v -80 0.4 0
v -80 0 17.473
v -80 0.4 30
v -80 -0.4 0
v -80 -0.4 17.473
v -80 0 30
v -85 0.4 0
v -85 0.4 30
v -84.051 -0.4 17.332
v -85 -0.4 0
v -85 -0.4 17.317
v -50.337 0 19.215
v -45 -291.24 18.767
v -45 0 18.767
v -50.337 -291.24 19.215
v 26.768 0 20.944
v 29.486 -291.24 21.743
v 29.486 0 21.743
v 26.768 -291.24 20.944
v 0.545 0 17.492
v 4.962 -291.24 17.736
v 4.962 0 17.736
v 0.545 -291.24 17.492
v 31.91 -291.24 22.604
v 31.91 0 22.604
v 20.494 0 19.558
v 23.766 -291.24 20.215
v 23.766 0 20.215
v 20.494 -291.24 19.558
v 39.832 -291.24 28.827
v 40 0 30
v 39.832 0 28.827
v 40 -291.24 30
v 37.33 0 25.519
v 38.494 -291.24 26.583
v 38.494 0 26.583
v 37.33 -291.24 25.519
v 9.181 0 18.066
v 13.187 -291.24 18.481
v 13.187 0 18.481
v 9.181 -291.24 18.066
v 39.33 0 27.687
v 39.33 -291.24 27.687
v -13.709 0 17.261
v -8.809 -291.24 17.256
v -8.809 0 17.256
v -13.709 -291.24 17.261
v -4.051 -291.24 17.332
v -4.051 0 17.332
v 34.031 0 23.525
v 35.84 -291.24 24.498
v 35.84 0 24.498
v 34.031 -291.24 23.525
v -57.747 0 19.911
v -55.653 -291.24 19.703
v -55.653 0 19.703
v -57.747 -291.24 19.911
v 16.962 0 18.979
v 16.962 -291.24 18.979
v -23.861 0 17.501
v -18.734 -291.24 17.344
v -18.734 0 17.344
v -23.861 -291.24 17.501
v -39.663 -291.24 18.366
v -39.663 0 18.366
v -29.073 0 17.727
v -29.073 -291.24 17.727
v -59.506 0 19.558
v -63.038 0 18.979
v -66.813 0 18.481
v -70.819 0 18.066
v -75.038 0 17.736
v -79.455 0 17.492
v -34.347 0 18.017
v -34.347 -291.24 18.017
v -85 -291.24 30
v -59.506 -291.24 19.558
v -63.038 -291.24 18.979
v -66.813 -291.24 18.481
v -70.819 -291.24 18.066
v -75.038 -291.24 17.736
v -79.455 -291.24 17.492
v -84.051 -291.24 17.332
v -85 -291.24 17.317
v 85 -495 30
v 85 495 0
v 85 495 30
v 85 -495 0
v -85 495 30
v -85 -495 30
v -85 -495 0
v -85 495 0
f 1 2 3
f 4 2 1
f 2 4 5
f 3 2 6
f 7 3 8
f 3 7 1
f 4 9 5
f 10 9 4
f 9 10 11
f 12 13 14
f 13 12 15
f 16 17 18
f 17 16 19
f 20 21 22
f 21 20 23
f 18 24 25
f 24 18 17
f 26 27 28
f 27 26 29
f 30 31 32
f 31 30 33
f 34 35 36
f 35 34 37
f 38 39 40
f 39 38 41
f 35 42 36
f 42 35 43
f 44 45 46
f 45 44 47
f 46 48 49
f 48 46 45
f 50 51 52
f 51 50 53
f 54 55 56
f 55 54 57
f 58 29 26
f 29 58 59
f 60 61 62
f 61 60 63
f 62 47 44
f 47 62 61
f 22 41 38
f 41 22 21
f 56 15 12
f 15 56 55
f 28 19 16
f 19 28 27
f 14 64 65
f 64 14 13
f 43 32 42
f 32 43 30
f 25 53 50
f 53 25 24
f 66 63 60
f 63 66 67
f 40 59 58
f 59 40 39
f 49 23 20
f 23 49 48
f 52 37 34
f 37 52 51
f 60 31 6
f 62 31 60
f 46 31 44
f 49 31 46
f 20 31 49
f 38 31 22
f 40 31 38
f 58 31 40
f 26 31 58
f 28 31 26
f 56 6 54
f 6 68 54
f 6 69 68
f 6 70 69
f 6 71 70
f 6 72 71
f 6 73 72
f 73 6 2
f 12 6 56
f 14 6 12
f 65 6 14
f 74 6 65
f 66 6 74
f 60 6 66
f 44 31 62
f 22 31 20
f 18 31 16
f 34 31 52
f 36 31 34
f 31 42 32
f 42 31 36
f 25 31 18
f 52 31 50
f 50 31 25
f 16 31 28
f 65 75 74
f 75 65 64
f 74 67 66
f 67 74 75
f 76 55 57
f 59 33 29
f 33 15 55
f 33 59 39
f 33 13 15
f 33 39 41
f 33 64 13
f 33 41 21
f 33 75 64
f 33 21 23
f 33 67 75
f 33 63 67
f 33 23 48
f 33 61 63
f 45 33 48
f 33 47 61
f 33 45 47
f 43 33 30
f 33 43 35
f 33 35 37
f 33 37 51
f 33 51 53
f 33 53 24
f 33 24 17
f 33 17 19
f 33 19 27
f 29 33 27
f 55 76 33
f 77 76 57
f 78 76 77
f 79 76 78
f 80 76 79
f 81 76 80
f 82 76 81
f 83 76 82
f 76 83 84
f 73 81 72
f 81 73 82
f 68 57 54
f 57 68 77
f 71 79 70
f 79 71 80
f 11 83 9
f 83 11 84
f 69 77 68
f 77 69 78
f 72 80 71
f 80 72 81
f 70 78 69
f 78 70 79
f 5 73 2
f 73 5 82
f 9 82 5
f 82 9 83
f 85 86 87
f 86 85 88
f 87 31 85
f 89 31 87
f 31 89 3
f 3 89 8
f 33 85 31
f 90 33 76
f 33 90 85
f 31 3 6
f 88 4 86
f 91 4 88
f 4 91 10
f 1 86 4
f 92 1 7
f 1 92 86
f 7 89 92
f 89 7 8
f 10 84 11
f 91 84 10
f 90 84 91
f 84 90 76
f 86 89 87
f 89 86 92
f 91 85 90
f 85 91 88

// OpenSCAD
// file: ../666_1032.scad
draft = true;   // sets rendering quality to draft.
$fs = draft ? 5 : 0.5;
$fa = 10;

module 666_1032(draft){

    airfoil_thickness = 0030;
    depth = main_tube_outer_diameter*2;
    width = main_tube_outer_diameter + 2*(main_tube_outer_diameter/10);
    height = depth;

    beta = 90 - trailing_edge_angle(naca = airfoil_thickness); // calculate the angle of trailing edge
    trailing_wall= 1/(cos(beta)); //calculate lenght of wall cut relative to wall thickness
    echo(trailing_wall); // print a relative thickness of material at traling edge to wall thickness. 

    difference (){
union(){

    difference(){
    	airfoil(naca = airfoil_thickness, L = 170, N=101, h = height_of_vertical_tube + main_tube_outer_diameter/2 + 2*global_clearance + coupling_wall_thickness, open = false);
    	translate ([hull_wall_thickness,0,45])
            resize([170 - hull_wall_thickness - trailing_wall*hull_wall_thickness,(170*airfoil_thickness/100)- 2*hull_wall_thickness,210], auto=true) 
                airfoil(naca = airfoil_thickness, L = 170, N=101, h = height_of_vertical_tube + main_tube_outer_diameter/2 + 2*global_clearance, open = false);
    }
    //lem spodní a horní díl
    intersection(){
        difference(){
            union(){
                translate([0,-75,cover_pilon_division[1] - hull_wall_thickness])
                        cube([190,150,hull_wall_thickness]);
                translate([0,-75,cover_pilon_division[1]])
                        cube([190,150,hull_wall_thickness]);
        }

        translate ([ribbon_width,0,45])
            resize([170 - ribbon_width - trailing_wall*ribbon_width,(170*airfoil_thickness/100)- 2*ribbon_width,210], auto=true) 
                airfoil(naca = airfoil_thickness, L = 170, N=101, h = height_of_vertical_tube + main_tube_outer_diameter/2 + 2*global_clearance, open = false);
    //difference
    }
        airfoil(naca = airfoil_thickness, L = 170, N=101, h = height_of_vertical_tube + main_tube_outer_diameter/2 + 2*global_clearance + coupling_wall_thickness, open = false);
}
}
    	//pro otevření
    	translate ([120,- hull_wall_thickness/2,- 2*global_clearance])
    	   cube ([60,hull_wall_thickness,height_of_vertical_tube + 4*global_clearance]);

    	translate ([main_tube_outer_diameter + coupling_wall_thickness*2,-depth/2 - global_clearance,height_of_vertical_tube - main_tube_outer_diameter*2 - global_clearance/2 + main_tube_outer_diameter/2 + coupling_wall_thickness])
    	   cube ([width*5,depth + 2*global_clearance,height+global_clearance + main_tube_outer_diameter]);

        // hull shell from 666_1025.scad
        translate ([- cover_pilon_position,0,0])
            rotate ([90,0,0])
                drop(draft);
    //final difference
    }
//final module
}


//pro tisk

module 666_1032_A(draft){
        intersection(){
                666_1032(draft);
            translate([0,- 75,0])
                cube([180,150,cover_pilon_division[1]]);
        }
}

module 666_1032_B(draft){
    translate([0,0,20])
        intersection(){
                666_1032(draft);
            translate([0,- 75,cover_pilon_division[1]])
                cube([180,150,cover_pilon_division[2] - cover_pilon_division[1]]);
        }
}

//666_1032(draft);
666_1032_A(draft);
666_1032_B(draft);

use <./lib/naca4.scad>
include <../Parameters.scad>
use <666_1025.scad>
use <888_1000.scad>
// file: ../888_1000.scad
/*
// Nastavení zobrazení
$vpr = [338, 0, 357];
$vpt = [180, 25, -18];
$vpd = 1280;
*/
//improving rendering speed.
draft = true;   // sets rendering quality to draft.
$fs = draft ? 5 : 0.5;
$fa = 10;

/*
TODO: 

Přední díl obsahuje převis ve směru vybrání pro držák motoru. (U horního zámku)
Otvory pro šrouby v předním dílu jsou oválné, protože nejsou kolmo k rovině modelu.


*/




//vnitřní kapka
module hollowing_skeleton(shell_thickness = hull_wall_thickness, draft)
{

    beta = 90 - trailing_edge_angle(naca = hull_airfoil_thickness); // calculate the angle of trailing edge
    trailing_wall= 1/(cos(beta)); //calculate lenght of wall cut relative to wall thickness 

    intersection () {
    resize([hull_drop_length - shell_thickness - trailing_wall* shell_thickness, (hull_drop_length*hull_airfoil_thickness/100) - 2*shell_thickness, (hull_drop_length*hull_airfoil_thickness/100) - 2*shell_thickness], auto=true)
            rotate ([0,90,0])           
            rotate_extrude($fn = draft ? 50 : 100)
                rotate([0,0,90])
                    difference()
                    {
                      polygon(points = airfoil_data(naca=hull_airfoil_thickness, L = hull_drop_length, N=draft ? 50 : 200)); 
                      square(hull_drop_length); 
                    }
                    
      translate([0,0,hull_corner_radius])
        minkowski(){                   
            translate ([0,- hull_y_size , - hull_z_size/2 + shell_thickness])
                cube ([hull_x_size,2*hull_y_size - shell_thickness, hull_z_size - 2*shell_thickness - 2*hull_corner_radius]);
                rotate ([0,90,0])
                    cylinder (h = 1, r = hull_corner_radius, $fn = draft ? 50 : 100);                   
          }
                            
    }
}

module hollowing_skeleton_hem(ribbon_width, draft)
{

    beta = 90 - trailing_edge_angle(naca = hull_airfoil_thickness); // calculate the angle of trailing edge
    trailing_wall= 1/(cos(beta)); //calculate lenght of wall cut relative to wall thickness 

    intersection () {
    resize([hull_drop_length - ribbon_width - trailing_wall* ribbon_width, (hull_drop_length*hull_airfoil_thickness/100) - 2*ribbon_width, (hull_drop_length*hull_airfoil_thickness/100) - 2*ribbon_width], auto=true)
            rotate ([0,90,0])           
            rotate_extrude($fn = draft ? 50 : 100)
                rotate([0,0,90])
                    difference()
                    {
                      polygon(points = airfoil_data(naca=hull_airfoil_thickness, L = hull_drop_length, N=draft ? 50 : 200)); 
                      square(hull_drop_length); 
                    }
                    
      translate([0,0,hull_corner_radius])
        minkowski(){                   
            translate ([0,- hull_y_size, - hull_z_size/2 + ribbon_width])
                cube ([hull_x_size,2*hull_y_size - ribbon_width, hull_z_size - 2*ribbon_width - 2*hull_corner_radius]);
                rotate ([0,90,0])
                    cylinder (h = 1, r = hull_corner_radius, $fn = draft ? 50 : 100);                   
          }
                            
    }
}




//celá kapka
module drop(draft = true)
{

    beta = 90 - trailing_edge_angle(naca = hull_airfoil_thickness); // calculate the angle of trailing edge
    trailing_wall= 1/(cos(beta)); //calculate lenght of wall cut relative to wall thickness 

	intersection () {
    	rotate ([0,90,0])           
        	rotate_extrude($fn = draft ? 50 : 100)
                    rotate([0,0,90])
                        difference()
                        {
	                        polygon(points = airfoil_data(naca=hull_airfoil_thickness, L =hull_drop_length , N=draft ? 50 : 200)); 
    	                    square(hull_drop_length); 
        	            }
            		
        translate([0,0,hull_corner_radius])
          	minkowski(){                   
             	translate ([0,-hull_y_size,-hull_z_size/2])
             			cube ([hull_x_size, 2*hull_y_size,hull_z_size-2*hull_corner_radius]);
             	  	rotate ([0,90,0])
                 		cylinder (h = 1, r = hull_corner_radius, $fn = draft ? 50 : 100);                   
		    }
		    
	}
}


//základní kapka
module drop_skin(draft){

	difference(){
			drop();
		translate([hull_wall_thickness,0,0])
			hollowing_skeleton();
	}

}




drop_skin();














use <./lib/naca4.scad>
include <../Parameters.scad>
// file: ../666_1025.scad
use <./lib/naca4.scad>
include <../Parameters.scad>
use <666_1032.scad>


//Jen pro názornost
	//translate([180,0,0])
		//rotate ([-90,0,0])
			//666_1032();





module 666_1025(){

    beta = 90 - trailing_edge_angle(naca = hull_airfoil_thickness); // calculate the angle of trailing edge
    trailing_wall= 1/(cos(beta)); //calculate lenght of wall cut relative to wall thickness
    echo(trailing_wall); // print a relative thickness of material at traling edge to wall thickness.    

    difference(){
        intersection () {
            union(){
        		rotate ([0,90,0])           
                    rotate_extrude($fn = 100)
                        rotate([0,0,90])
                            difference()
                            {

                              polygon(points = airfoil_data(naca=hull_airfoil_thickness, L =hull_drop_length , N=100)); 
                              square(hull_drop_length); 
                            }

                // 666_1032 part holder
                translate([180,0,0]) 
                    rotate ([-90,0,0]) 
                        difference(){
                            
                            translate ([hull_wall_thickness,0,0])
                                resize([170 - hull_wall_thickness - trailing_wall*hull_wall_thickness,(170*0030/100)- 2*hull_wall_thickness,210], auto=true) 
                                    airfoil(naca = 0030, L = 170, N=101, h = 200, open = false);
                            translate ([2*hull_wall_thickness,0,0])       
                                resize([170 - hull_wall_thickness*2 - trailing_wall*hull_wall_thickness*2,(160*0030/100)- 2*hull_wall_thickness,210], auto=true) 
                                    airfoil(naca = 0030, L = 170, N=101, h = 200, open = false);
                            
                        }

            }
            minkowski(){                   
             	translate ([0,-(main_tube_outer_diameter/2)+1,-hull_z_size/2])
             		cube ([hull_x_size, hull_y_size,hull_z_size]);
             	
             		rotate ([0,90,0])
                 		cylinder (h = 1, r = hull_corner_radius, $fn = 100);                   

        	}

        }   

        //hollowing skeleton
    		translate ([hull_wall_thickness,0,0])
            	intersection () {
                    resize([hull_drop_length - hull_wall_thickness - trailing_wall* hull_wall_thickness, (hull_drop_length*hull_airfoil_thickness/100) - 2*hull_wall_thickness, (hull_drop_length*hull_airfoil_thickness/100) - 2*hull_wall_thickness], auto=true)
                 		rotate ([0,90,0])           
                            rotate_extrude($fn = 100)
                                rotate([0,0,90])
                                    difference()
                                    {

                                      polygon(points = airfoil_data(naca=hull_airfoil_thickness, L = hull_drop_length, N=200)); 
                                      square(hull_drop_length); 
                                    }
                 	minkowski(){                   
                     	translate ([0,-(main_tube_outer_diameter/2),-hull_z_size/2 + hull_wall_thickness])
                     		cube ([hull_x_size,hull_y_size - hull_wall_thickness, hull_z_size - 2*hull_wall_thickness]);
                     		rotate ([0,90,0])
                         		cylinder (h = 1, r = hull_corner_radius, $fn = 100);                   
            		}                   
            	}
            //for front part
    		translate ([-2,-1 - main_tube_outer_diameter/2,-25])
    				cube ([52,hull_y_size+10,50]);

        //for tube in back
    		translate ([hull_x_size-70,0,0])
    			rotate ([0,90,0])
    				cylinder (h = 80, r1 = main_tube_outer_diameter/2, r2 = main_tube_outer_diameter/2, $fn = 200);
    					    
        //for tube - propeller

			translate ([180+2*hull_wall_thickness,-10,0])       
				rotate ([-90,0,0])
                    resize([170 - hull_wall_thickness*2 - trailing_wall*hull_wall_thickness*2,(160*0030/100)- 2*hull_wall_thickness,210], auto=true) 
                        airfoil(naca = 0030, L = 170, N=101, h = 200, open = false);
        			
        //for printing
    		translate([0,-main_tube_outer_diameter/2-4.90,-170/2])
    			cube ([600,5,170]);

    		translate([hull_x_size-50,-main_tube_outer_diameter,-main_tube_outer_diameter/2])		
    			cube([80,main_tube_outer_diameter, main_tube_outer_diameter]);	

    }


}

    intersection(){
        666_1025();
        translate([0,-20,-150])                        
           cube([150,150,300]);
    }

    translate([20,0,0])
        intersection(){
            666_1025();
            translate([150,-20,-150])
               cube([150,150,300]);
        }

    translate([40,0,0])
        intersection(){
            666_1025();
            translate([300,-20,-150])
               cube([150,150,300]);
        }


    translate([60,0,0])
        intersection(){
            666_1025();
            translate([450,-20,-150])
               cube([150,150,300]);
        }
// file: ../lib/naca4.scad
// Naca4.scad - library for parametric airfoils of 4 digit NACA series
// Code: Rudolf Huttary, Berlin 
// June 2015
// commercial use prohibited


// general use: for more examples refer to sampler.scad
// naca = naca digits or 3el vector  (default = 12 or [0, 0, .12])
// L    = chord length [mm]      (default= 100)
// N    = # sample points        (default= 81)
// h    = height [mm]            (default= 1)
// open = close at the thin end? (default = true)
// two equivalent example calls
 airfoil(naca = 2408, L = 60, N=1001, h = 30, open = false); 
// airfoil(naca = [.2, .4, .32], L = 60, N=1001, h = 30, open = false); 

module help()
{
  echo(str("\n\nList of signatures in lib:\n=================\n", 
  "module airfoil(naca=2412, L = 100, N = 81, h = 1, open = false) - renders airfoil object\n", 
  "module airfoil(naca=[.2, .4, .12], L = 100, N = 81, h = 1, open = false) - renders airfoil object using percentage for camber,  camber distance and thicknes\n", 
  "function airfoil_data(naca=12, L = 100, N = 81, open = false)\n",
  "=================\n")); 
}

help(); 
// this is the object
module airfoil(naca=12, L = 100, N = 81, h = 1, open = false)
{
  linear_extrude(height = h)
  polygon(points = airfoil_data(naca, L, N, open)); 
}

module hollow_airfoil(lnaca=12, L = 100, N = 81, h = 1, open = false, wall_thickness = 1)
{
    if (open){
        linear_extrude(height = h)

        if (wall_thickness>0){
            difference(){
                polygon(points = airfoil_data(naca, L, N, false));
                offset(delta = - wall_thickness, chamfer = false) polygon(points = airfoil_data(naca, L, N, open = false));
            }
        }
        else{
            difference(){
                offset(delta = - wall_thickness, chamfer = false) polygon(points = airfoil_data(naca, L, N, open = false));
                polygon(points = airfoil_data(naca, L, N, false));
            }
        }
    }
    else{

        linear_extrude(height = abs(wall_thickness))
            polygon(points = airfoil_data(naca, L, N, false)); 

        linear_extrude(height = h)
            difference(){
                polygon(points = airfoil_data(naca, L, N, open));
                offset(delta = - wall_thickness) polygon(points = airfoil_data(naca, L, N, open = false));
            }

        translate([0,0, h - wall_thickness])
            linear_extrude(height = abs(wall_thickness))
                polygon(points = airfoil_data(naca, L, N, false)); 

    }
}


// this is the main function providing the airfoil data
function airfoil_data(naca=12, L = 100, N = 81, open = false) = 
  let(Na = len(naca)!=3?NACA(naca):naca)
  let(A = [.2969, -0.126, -.3516, .2843, open?-0.1015:-0.1036])
  [for (b=[-180:360/(N):179.99]) 
    let (x = (1-cos(b))/2)  
    let(yt = sign(b)*Na[2]/.2*(A*[sqrt(x), x, x*x, x*x*x, x*x*x*x])) 
    Na[0]==0?L*[x, yt]:L*camber(x, yt, Na[0], Na[1], sign(b))];  


function trailing_edge_angle(naca=12, open = false) = 
  let(Na = len(naca)!=3?NACA(naca):naca)
  let(A = [.2969, -0.126, -.3516, .2843, open?-0.1015:-0.1036])
  let (x =0.999)  // set x near to airfoil trailing edge
  let(yt = Na[2]/.2*(A*[sqrt(x), x, x*x, x*x*x, x*x*x*x])) // calculate distance from x-axis at previously set position
  atan2(yt,1-x);  // calculate angle of triangle between end of airfoil. The triange height corresponds to previously calculated distance from x-axis

function surface_angle(x = 0.5, naca=12, open = false) = 
  let(Na = len(naca)!=3?NACA(naca):naca)
  let(A = [0.2969, -0.126, -0.3516, 0.2843, open?-0.1015:-0.1036])
  let(dy = Na[2]/0.2*(A*[(1/2)*(1/sqrt(x)), 1, 2*x, 3*x*x, 4*x*x*x])) // calculate derivative of airfoil function at the x point
  atan(dy);  // calculate  the angle from function derivative

function surface_distance(x = 0.5, naca=12, open = false) = 
  let(Na = len(naca)!=3?NACA(naca):naca)
  let(A = [0.2969, -0.126, -0.3516, 0.2843, open?-0.1015:-0.1036])
  Na[2]/.2*(A*[sqrt(x), x, x*x, x*x*x, x*x*x*x]); // calculate distance from x-axis at previously set position

// helper functions
function NACA(naca) = 
  let (M = floor(naca/1000))
  let (P = floor((naca-M*1000)/100)) 
  [M/100, P/10, floor(naca-M*1000-P*100)/100];  

function camber(x, y, M, P, upper) = 
  let(yc = (x<P)?M/P/P*(2*P*x-x*x): M/(1-P)/(1-P)*(1 - 2*P + 2*P*x -x*x))
  let(dy = (x<P)?2*M/P/P*(P-x):2*M/(1-P)/(1-P)*(P-x))
  let(th = atan(dy))
  [upper ? x - y*sin(th):x + y*sin(th), upper ? yc + y*cos(th):yc - y*cos(th)];
// file: rotor_blade_double.scad
include <../../Parameters.scad>
use <../333_1037.scad>

$vpd = 680;

module rotor_blade_double(draft)
{
    draft = false;        
    plywood_thickness = 4;
    core_thickness = 1.0;
    length = 970;       // celková délka polotovaru
    material_width = 70;
    side_margin = 10; 

    x_size = 2*material_width + 3*side_margin;
    y_size = length + 2*side_margin;
    translate([-x_size/2, -y_size/2,0])
        cube([x_size,y_size, plywood_thickness]);

    translate([- material_width/2 - side_margin/2, 0, plywood_thickness + core_thickness/2])
        333_1037(twosided = true, draft = draft);

    translate([material_width/2 + side_margin/2, 0, plywood_thickness + core_thickness/2])
        333_1037(twosided = true, draft = draft);
}

rotor_blade_double();
// file: ../333_1037.scad
draft = true;   // sets rendering quality to draft.
$fs = draft ? 5 : 0.5;
$fa = 10;

module 333_1037(draft){

    airfoil_thickness = 0015;
    airfoil_depth = main_tube_outer_diameter*2;
    lenght = 970;


    difference (){
        %cube ([970,70,3.86*2], center = true);

    	translate ([120,- hull_wall_thickness/2,- 2*global_clearance])
            cube ([60,hull_wall_thickness,height_of_vertical_tube + 4*global_clearance]);
    }

    //translate ([120,- hull_wall_thickness/2,- 2*global_clearance])
    rotate([90,0,0])
        airfoil(naca = airfoil_thickness, L = 170, N = draft ? 50 : 100, h = height_of_vertical_tube + main_tube_outer_diameter/2 + 2*global_clearance + thickness_between_tubes, open = false);

}



333_1037(draft);

use <./lib/naca4.scad>
include <../Parameters.scad>
use <666_1025.scad>
use <888_1000.scad>
// file: ../../Parameters.scad
//Main tube diameter - hole [mm]
main_tube_outer_diameter = 25.4;
main_tube_inner_diameter = 23.5;

//Tube for undercarriage - hole [mm]
tube_for_undercarriage_outer_diameter = 10.6;
tube_for_undercarriage_inner_diameter = 6;
global_clearance = 0.5;


//umístění podvozkových trubek

second_undercarriage_hole = main_tube_outer_diameter*2 + main_tube_outer_diameter/5 + main_tube_outer_diameter/2 + 170 + 160;

// Parameters of cube couplings
coupling_wall_thickness = main_tube_outer_diameter/5;  //width of coupling walls 
thickness_between_tubes = main_tube_outer_diameter/10;    // minimum distance between tubes in couplings

coupling_wall_thickness_undercarriage = tube_for_undercarriage_outer_diameter/3;
thickness_between_tubes_undercarriage = tube_for_undercarriage_outer_diameter/10;

//Screw diameter and nut for M4 [mm]
M4_screw_diameter=4.5;
Nut_height_M4 = 3.2;
Nut_diameter_M4 = 7.86;


//Screw diameter and nut for M3 [mm]
M3_screw_diameter = 3.2;
Nut_height_M3 = 1.7;	
Nut_diameter_M3 = 6.6; 


//The tube for help
Help_main_tube_outer = 25;
Help_main_tube_inner = 23; 
Help_tube_for_undercarriage_outer = 10;
Help_tube_for_undercarriage_inner = 5;


//main hull parameters

hull_drop_length = 580;
hull_wall_thickness = 0.8;
hull_y_size = 120;
hull_z_size = 150;
hull_x_size = 580;
hull_corner_radius = 4;
hull_airfoil_thickness= 35;  // thickness of drop generating airfoil in percent of lenght.
hull_scale_x = 1;
hull_scale_y = 1.5;
hull_scale_z = 1.5;

main_pilon_position = 170+68;
cover_pilon_position = 180;
height_of_vertical_tube = 275; //278mm je změřená délka trubky. 

ribbon_width = 5; // šířka vyztužovacích lemů. 

// šířka otvoru v přední části kapoty pro držák motoru.
width_of_engine_holder = 63;

//Top Cover Division - dělení horního krytu pro tisk
top_cover_division = [0, 50, 150, 280, 410, hull_x_size]; // upraveny seznam tak, aby deleni začinalo od nuly, což umožňí úplně automatické rozdělení.

//Bottom Cover Division - dělení dolního krytu pro tisk
bottom_cover_division = [0,100,250,365, 470, hull_x_size];
// zkrácená část pro payload pro testovací tisk
//bottom_cover_division = [0,200,250,365, 470, hull_x_size];

//Base Divison - dělení podložky
base_division = [0,140,280,410, hull_x_size];

//Cover pilon division - na výšku (v ose Z)
cover_pilon_division = [0,170,height_of_vertical_tube + main_tube_outer_diameter + coupling_wall_thickness];

//pozice šroubů
	//horní kryt
top_screw_position = [0, (top_cover_division[0] + top_cover_division[1])/4, (top_cover_division[2] - top_cover_division[1])/2 + top_cover_division[1], (top_cover_division[3] - top_cover_division[2])/2 + top_cover_division[2],(top_cover_division[4] - top_cover_division[3])/2 + top_cover_division[3],(top_cover_division[5] - top_cover_division[4])/2 + top_cover_division[4] - 20];
	//spodní kryt
bottom_screw_position = [0,(bottom_cover_division[0] + bottom_cover_division[1])/15 + 5, bottom_cover_division[1]/1.1, + bottom_cover_division[3], bottom_cover_division[3] + bottom_cover_division[1]/2, bottom_cover_division[4] - 6*global_clearance, bottom_cover_division[4] + bottom_cover_division[1]/2.5];




//šířka zámků
lock_width = 10;

//délka zámků
lock_length = 3;


//accumulator
//základní rozměry akumulátoru
width_of_accumulator = 129.4;//45+1;
depth_of_accumulator = 40.61;
height_of_accumulator = 43.65;
//Zapuštění akumulátoru
sink_of_accumulator = 5; //main_tube_outer_diameter/5 - Nut_height_M3*1.5;

//tloušťka hrany spojky
accumulator_holder_width = 18; 
accumulator_holder_thickness = 10; 

//posunutí akumálátoru na podložce
move_of_accumulator = 165;   // pozice akumulátoru (ovlivňuje těžiště)


////////////////
// Senzory
///////////////////

//opticalFlow
    width_optical_flow_senzor = 45.5;
    depth_optical_flow_senzor = 6;
    height_optical_flow_senzor = 35;
    sink_of_optical_flow_senzor = depth_optical_flow_senzor - 5; 
    M3_optical_flow_senzor_Z = 30.4;
    M3_optical_flow_senzor_X = 24;
    M3_optical_flow_senzor_Z_alone = 9.1;
    M3_optical_flow_senzor_X_alone = 16.7;
// main file
include <../../Parameters.scad>
use <../333_1037.scad>

use <rotor_blade_double.scad>

$vpd = 680;

draft = true;        
plywood_thickness = 4;
thickness = 30;
core_thickness = 1.0;
length = 970;       // celková délka polotovaru
material_width = 70;
side_margin = 10; 

difference()
{
    x_size = 2*material_width + 3*side_margin;
    y_size = length + 2*side_margin;
    translate([-x_size/2, -y_size/2, 0])
        cube([x_size,y_size, thickness]);

    translate([0, 0, thickness + plywood_thickness + core_thickness/2])
        rotate([0,180,0])
            rotor_blade_double(draft);
}
